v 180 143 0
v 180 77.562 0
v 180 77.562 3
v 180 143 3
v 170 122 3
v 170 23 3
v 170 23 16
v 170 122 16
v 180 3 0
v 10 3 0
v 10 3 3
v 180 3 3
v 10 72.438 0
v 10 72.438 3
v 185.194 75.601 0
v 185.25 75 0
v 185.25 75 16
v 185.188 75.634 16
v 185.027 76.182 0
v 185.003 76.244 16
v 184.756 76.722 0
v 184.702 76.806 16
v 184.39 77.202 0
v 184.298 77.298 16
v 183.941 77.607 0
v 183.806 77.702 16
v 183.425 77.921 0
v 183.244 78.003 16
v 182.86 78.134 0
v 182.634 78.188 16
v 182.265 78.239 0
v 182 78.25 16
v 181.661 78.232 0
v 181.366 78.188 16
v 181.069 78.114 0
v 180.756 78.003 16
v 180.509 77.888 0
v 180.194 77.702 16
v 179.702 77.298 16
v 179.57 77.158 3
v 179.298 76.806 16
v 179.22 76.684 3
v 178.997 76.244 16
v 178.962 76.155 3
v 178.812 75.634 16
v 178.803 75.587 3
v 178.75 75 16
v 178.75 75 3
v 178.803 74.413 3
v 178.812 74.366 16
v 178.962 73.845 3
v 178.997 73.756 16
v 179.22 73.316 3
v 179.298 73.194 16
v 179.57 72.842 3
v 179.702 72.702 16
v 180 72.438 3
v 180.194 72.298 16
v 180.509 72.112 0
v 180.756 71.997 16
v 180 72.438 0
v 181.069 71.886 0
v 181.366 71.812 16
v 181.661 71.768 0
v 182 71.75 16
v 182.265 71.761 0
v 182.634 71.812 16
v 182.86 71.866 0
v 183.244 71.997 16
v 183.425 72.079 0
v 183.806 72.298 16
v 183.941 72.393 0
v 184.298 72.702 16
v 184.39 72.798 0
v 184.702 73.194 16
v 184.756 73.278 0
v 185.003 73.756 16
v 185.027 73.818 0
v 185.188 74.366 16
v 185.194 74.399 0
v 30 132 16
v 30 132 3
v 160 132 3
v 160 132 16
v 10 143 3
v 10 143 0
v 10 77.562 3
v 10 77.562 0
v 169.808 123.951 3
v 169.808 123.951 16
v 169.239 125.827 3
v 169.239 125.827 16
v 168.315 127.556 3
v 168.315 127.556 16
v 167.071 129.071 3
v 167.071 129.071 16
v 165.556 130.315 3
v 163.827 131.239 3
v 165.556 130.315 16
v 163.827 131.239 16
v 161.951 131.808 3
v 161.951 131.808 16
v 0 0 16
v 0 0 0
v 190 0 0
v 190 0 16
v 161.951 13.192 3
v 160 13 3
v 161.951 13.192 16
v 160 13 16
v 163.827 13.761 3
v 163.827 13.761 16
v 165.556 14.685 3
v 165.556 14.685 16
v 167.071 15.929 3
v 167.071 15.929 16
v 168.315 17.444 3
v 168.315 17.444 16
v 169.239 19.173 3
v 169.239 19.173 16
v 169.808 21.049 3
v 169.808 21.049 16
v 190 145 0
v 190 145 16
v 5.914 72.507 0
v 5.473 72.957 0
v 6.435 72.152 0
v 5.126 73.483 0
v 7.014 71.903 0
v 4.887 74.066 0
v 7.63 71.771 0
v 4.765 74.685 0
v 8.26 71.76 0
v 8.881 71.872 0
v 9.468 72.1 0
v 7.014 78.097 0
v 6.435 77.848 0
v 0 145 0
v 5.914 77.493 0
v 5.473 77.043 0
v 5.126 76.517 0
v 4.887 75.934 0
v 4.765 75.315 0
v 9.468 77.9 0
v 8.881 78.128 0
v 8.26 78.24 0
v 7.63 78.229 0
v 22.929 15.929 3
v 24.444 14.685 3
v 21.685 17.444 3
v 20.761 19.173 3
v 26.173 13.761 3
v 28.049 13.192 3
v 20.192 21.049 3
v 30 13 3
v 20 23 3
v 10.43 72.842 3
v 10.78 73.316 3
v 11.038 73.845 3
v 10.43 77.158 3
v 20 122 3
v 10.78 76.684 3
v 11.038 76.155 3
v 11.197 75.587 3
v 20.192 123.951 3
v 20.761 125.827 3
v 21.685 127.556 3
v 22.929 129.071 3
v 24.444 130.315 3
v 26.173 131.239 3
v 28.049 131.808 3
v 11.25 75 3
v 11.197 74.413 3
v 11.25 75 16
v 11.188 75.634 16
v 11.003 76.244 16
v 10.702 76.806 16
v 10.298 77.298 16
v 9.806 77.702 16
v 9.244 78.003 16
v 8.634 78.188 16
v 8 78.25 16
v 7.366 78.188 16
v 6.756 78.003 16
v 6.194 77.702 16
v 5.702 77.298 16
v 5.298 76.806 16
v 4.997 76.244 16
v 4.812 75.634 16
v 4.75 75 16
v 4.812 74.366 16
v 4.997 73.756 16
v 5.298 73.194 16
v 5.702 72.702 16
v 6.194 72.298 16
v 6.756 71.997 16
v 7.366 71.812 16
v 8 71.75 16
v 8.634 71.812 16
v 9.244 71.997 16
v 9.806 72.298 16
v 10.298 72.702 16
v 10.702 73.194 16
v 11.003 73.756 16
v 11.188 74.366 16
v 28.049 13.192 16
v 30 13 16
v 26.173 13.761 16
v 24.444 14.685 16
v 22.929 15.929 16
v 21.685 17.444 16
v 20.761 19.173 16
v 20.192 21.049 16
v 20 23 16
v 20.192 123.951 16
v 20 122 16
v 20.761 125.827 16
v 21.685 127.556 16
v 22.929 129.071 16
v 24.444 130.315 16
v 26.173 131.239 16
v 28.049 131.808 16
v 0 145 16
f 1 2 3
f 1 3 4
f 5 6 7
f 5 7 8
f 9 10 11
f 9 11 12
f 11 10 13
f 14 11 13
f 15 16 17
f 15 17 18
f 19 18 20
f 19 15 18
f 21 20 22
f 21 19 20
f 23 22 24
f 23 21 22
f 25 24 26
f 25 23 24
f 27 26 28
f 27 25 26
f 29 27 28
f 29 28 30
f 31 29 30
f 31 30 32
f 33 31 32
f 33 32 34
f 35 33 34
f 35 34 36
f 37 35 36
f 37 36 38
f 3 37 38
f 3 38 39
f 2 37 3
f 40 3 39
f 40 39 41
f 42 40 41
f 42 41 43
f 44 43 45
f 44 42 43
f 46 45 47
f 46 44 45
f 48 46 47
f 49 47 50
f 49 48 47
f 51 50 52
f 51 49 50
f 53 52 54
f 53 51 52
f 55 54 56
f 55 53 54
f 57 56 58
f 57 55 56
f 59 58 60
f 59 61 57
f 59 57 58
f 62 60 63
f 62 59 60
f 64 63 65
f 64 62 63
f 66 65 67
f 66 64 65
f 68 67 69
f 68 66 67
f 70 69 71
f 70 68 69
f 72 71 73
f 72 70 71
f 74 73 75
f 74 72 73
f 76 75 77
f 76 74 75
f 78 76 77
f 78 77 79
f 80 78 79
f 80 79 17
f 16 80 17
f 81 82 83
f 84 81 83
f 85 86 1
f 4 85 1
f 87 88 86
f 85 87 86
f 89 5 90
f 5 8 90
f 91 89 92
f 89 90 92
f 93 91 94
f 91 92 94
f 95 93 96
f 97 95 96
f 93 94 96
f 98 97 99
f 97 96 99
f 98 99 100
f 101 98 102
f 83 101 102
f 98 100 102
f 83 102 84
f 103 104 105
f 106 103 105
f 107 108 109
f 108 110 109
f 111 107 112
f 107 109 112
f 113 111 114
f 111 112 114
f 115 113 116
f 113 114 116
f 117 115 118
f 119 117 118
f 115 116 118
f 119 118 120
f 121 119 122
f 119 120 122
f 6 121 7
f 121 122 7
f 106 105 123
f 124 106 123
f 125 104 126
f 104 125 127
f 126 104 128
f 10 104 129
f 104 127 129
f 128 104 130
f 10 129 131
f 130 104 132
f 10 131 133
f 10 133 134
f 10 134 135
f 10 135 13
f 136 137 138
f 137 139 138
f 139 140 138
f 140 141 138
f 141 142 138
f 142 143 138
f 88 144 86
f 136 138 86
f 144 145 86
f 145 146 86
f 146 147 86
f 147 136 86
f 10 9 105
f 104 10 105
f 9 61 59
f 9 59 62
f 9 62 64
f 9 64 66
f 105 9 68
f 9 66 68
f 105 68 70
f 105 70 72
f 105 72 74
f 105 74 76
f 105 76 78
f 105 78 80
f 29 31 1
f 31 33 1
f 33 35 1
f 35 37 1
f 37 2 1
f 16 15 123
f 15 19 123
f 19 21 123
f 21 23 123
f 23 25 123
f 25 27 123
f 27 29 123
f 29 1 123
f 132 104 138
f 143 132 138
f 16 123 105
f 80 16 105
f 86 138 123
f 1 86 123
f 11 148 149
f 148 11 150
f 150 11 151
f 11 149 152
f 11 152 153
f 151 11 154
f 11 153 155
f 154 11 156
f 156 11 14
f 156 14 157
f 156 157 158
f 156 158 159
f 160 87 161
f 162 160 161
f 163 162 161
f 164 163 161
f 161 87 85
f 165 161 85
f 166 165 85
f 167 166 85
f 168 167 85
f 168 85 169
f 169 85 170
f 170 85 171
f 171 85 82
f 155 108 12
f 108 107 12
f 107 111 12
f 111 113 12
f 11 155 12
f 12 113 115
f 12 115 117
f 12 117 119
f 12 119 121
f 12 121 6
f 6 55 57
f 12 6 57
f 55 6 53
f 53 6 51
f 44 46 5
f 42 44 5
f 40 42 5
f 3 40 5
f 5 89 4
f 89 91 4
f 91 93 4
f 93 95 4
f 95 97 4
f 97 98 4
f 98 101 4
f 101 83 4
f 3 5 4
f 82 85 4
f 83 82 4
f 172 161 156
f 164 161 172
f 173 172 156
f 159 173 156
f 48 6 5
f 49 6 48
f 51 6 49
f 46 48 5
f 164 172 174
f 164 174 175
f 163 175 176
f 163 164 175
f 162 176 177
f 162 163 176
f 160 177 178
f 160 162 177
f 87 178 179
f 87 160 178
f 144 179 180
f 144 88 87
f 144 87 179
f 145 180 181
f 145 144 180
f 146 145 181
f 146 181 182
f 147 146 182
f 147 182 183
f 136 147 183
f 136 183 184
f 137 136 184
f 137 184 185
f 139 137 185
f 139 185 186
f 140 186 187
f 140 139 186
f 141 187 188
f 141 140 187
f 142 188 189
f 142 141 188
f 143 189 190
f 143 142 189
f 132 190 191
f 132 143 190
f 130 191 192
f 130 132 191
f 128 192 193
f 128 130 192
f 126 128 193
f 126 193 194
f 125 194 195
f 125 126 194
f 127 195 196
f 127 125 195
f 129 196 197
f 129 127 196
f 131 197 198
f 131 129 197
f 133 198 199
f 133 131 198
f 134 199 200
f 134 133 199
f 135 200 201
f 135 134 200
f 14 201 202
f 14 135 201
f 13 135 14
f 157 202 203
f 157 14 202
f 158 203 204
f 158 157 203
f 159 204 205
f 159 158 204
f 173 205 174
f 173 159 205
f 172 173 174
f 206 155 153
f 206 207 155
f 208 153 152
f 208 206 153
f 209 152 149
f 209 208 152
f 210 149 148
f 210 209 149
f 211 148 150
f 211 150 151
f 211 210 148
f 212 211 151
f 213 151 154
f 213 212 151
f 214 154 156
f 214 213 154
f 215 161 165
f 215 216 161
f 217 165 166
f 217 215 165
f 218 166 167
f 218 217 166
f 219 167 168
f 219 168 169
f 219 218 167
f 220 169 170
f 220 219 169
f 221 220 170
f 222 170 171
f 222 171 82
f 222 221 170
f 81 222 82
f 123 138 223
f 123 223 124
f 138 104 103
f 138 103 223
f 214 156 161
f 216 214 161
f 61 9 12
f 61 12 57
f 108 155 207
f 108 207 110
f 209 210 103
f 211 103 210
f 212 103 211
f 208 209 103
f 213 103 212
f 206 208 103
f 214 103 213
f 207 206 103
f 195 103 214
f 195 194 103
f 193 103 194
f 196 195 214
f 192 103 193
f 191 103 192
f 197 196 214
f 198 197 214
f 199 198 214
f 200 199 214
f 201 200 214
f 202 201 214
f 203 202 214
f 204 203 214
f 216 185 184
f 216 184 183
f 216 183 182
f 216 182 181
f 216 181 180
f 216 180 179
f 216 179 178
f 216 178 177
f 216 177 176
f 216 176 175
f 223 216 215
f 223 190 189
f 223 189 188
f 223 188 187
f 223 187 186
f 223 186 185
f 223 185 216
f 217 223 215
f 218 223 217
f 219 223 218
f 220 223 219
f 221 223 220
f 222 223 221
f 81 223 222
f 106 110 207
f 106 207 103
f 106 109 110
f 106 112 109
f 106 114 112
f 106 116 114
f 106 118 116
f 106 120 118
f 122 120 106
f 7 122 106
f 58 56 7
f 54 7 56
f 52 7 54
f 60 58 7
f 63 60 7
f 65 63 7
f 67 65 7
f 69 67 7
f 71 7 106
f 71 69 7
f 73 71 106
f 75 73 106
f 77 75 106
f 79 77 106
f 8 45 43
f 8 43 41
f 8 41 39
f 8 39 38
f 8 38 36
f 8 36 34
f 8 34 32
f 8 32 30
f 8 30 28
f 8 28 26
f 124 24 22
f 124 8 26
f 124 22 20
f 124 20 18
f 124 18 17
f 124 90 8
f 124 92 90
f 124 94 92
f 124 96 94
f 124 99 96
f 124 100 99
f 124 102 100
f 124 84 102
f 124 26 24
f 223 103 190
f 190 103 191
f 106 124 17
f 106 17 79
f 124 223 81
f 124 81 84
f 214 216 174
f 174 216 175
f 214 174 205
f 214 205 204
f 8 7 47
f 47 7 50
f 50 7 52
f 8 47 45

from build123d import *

# Parameters (mm, degrees)
CYLINDER_R     = 3.25
CYLINDER_DEPTH = 26
ARRAY_X_COUNT  = 2
ARRAY_X_PITCH  = 174
BOX002_W       = 170
BOX002_H       = 140
BOX002_DEPTH   = 3
BOX001_W       = 150
BOX001_H       = 119
BOX001_DEPTH   = 16
BOX_W          = 190
BOX_H          = 145
BOX_DEPTH      = 16
FILLET_R       = 10


with BuildPart() as array:
    # Cylinder → Cylinder (new body)
    with BuildSketch(Plane(origin=(8, 75, 0), x_dir=(1, 0, 0), z_dir=(0, 0, 1))):
        Circle(CYLINDER_R)
    extrude(amount=CYLINDER_DEPTH)

    # Array X: Array ×2


with BuildPart() as array_1:
    add(array.part)
    with Locations(*[(i * ARRAY_X_PITCH, 0, 0) for i in range(1, ARRAY_X_COUNT)]):
        add(array.part)


with BuildPart() as cubo001:
    # Box002 → Box002 (new body)
    with BuildSketch(Plane(origin=(10, 3, 0), x_dir=(1, 0, 0), z_dir=(0, 0, 1))):
        with Locations((85, 70)):
            Rectangle(BOX002_W, BOX002_H)
    extrude(amount=BOX002_DEPTH)


with BuildPart() as fusion:
    # Box001 → Box001 (new body)
    with BuildSketch(Plane(origin=(20, 13, 0), x_dir=(1, 0, 0), z_dir=(0, 0, 1))):
        with Locations((75, 59.5)):
            Rectangle(BOX001_W, BOX001_H)
    extrude(amount=BOX001_DEPTH)

    # Fusion: union Cubo001
    add(cubo001.part)


with BuildPart() as fillet_body:
    # Box → Box (new body)
    with BuildSketch(Plane.XY):
        with Locations((95, 72.5)):
            Rectangle(BOX_W, BOX_H)
    extrude(amount=BOX_DEPTH)

    # Cut: cut Fusion
    add(fusion.part, mode=Mode.SUBTRACT)

    # Cut001: cut Array
    add(array_1.part, mode=Mode.SUBTRACT)

    # Fillet
    fillet_edges = [fillet_body.edges().sort_by_distance(p)[0] for p in [
        (170, 132, 9.5),
        (20, 132, 9.5),
        (170, 13, 9.5),
        (20, 13, 9.5),
    ]]
    fillet(fillet_edges, radius=FILLET_R)


solid = fillet_body.part
